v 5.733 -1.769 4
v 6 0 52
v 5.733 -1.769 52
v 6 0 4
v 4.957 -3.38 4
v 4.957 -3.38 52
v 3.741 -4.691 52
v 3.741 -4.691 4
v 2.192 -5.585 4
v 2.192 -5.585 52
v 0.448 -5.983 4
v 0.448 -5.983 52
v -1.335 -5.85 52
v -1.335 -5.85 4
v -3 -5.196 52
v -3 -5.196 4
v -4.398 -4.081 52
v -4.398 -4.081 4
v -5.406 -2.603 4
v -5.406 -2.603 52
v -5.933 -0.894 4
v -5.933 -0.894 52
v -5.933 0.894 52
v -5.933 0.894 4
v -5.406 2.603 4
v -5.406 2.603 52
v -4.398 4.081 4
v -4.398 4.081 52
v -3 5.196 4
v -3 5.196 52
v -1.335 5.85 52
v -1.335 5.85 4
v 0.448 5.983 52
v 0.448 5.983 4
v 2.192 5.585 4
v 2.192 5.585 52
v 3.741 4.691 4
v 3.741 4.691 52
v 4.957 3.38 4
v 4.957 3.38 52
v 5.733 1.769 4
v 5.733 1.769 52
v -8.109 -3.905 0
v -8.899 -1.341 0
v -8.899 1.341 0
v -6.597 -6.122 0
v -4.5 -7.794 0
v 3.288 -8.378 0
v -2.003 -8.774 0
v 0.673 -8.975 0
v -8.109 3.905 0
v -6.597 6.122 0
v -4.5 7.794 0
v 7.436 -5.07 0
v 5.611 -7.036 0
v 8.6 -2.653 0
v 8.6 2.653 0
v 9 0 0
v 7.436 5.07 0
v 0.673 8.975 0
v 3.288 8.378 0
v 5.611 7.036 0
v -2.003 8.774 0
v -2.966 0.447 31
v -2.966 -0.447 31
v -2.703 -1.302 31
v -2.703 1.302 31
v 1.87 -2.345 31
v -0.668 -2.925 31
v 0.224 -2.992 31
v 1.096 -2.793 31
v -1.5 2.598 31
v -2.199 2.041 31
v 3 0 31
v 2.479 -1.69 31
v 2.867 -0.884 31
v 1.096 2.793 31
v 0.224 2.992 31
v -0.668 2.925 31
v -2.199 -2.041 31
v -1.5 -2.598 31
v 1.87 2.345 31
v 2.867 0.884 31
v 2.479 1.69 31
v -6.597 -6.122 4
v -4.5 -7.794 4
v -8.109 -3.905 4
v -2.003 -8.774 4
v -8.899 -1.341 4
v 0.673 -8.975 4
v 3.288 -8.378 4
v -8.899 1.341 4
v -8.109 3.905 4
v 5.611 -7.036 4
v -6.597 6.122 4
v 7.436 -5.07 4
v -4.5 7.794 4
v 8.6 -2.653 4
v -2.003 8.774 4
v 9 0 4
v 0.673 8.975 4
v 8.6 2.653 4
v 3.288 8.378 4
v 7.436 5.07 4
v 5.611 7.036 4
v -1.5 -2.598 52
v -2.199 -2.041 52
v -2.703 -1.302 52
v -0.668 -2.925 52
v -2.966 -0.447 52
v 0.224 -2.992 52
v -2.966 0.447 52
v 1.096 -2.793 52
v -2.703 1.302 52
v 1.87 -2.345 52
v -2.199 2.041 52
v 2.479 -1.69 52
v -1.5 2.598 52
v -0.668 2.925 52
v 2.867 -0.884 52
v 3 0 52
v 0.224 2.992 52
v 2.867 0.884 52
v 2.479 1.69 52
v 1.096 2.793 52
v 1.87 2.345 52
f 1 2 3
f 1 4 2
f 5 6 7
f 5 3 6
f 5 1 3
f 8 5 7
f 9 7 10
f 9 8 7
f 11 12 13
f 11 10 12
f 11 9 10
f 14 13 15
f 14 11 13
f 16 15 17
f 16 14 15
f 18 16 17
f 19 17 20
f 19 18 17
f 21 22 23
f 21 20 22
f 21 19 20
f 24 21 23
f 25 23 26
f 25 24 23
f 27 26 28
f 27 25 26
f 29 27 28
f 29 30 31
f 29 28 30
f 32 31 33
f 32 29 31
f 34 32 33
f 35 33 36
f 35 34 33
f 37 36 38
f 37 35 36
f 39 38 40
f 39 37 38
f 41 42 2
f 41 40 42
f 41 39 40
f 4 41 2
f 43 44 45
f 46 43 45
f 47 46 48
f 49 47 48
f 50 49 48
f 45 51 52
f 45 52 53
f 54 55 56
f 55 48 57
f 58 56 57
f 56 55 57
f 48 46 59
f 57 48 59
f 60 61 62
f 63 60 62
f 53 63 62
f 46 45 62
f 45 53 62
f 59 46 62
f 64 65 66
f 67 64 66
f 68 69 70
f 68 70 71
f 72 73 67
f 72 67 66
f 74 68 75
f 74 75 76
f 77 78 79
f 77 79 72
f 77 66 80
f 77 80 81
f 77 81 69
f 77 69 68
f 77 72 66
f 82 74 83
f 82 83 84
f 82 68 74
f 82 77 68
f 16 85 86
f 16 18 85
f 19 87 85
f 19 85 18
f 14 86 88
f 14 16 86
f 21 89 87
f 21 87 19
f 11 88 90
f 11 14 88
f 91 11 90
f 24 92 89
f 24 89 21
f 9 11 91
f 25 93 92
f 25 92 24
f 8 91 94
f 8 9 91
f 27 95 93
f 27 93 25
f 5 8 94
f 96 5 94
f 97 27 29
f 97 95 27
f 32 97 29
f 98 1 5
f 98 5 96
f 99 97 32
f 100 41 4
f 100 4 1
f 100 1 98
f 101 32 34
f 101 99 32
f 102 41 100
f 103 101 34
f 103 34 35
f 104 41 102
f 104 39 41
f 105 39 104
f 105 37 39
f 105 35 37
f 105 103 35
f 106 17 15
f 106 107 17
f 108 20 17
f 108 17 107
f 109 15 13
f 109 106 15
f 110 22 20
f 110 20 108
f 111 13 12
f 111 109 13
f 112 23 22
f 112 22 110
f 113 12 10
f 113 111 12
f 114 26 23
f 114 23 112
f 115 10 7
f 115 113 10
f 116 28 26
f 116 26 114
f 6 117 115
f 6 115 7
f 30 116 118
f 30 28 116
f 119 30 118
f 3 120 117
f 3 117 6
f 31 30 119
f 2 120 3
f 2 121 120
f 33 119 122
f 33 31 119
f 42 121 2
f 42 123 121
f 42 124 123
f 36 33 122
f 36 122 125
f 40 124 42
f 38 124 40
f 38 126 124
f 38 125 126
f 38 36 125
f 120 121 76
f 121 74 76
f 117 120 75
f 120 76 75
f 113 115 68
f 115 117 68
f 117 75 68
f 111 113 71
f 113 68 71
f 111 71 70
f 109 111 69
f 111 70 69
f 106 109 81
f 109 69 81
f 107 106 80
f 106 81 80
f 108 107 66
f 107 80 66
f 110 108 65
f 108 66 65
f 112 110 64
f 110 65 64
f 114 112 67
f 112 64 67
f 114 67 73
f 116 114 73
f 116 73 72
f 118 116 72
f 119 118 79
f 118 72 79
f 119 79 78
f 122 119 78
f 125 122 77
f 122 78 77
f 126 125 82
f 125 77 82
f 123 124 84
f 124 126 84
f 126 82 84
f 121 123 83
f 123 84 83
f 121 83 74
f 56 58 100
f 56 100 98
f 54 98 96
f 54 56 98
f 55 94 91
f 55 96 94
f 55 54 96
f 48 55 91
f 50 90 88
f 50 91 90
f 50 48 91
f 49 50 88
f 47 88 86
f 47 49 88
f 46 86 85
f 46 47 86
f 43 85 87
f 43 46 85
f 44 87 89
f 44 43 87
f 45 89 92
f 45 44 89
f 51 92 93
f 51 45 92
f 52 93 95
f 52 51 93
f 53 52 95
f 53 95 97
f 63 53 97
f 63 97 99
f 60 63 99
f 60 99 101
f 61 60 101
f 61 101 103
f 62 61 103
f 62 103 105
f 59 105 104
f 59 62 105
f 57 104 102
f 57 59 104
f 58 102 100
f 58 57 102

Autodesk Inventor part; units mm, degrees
ref_plane "YZ Plane" through (0, 0, 0) normal (1, 0, 0) x (0, 1, 0)
ref_plane "XZ Plane" through (0, 0, 0) normal (0, 1, 0) x (-1, 0, 0)
ref_plane "XY Plane" through (0, 0, 0) normal (0, 0, 1) x (1, 0, 0)
sketch "Sketch1" plane through (0, 0, 0) normal (0, 0, 1) x (1, 0, 0)
  circle A0 centre (0, 0) radius 9
  dimension "d0" = 18
extrude "Extrusion1" add sketch "Sketch1" along normal blind 4
sketch "Sketch2" plane through (0, 0, 4) normal (0, 0, 1) x (1, 0, 0)
  circle A0 centre (0, 0) radius 6
  circle A1 centre (0, 0) radius 3
  dimension "d3" = 12
  dimension "d4" = 6
extrude "Extrusion2" add sketch "Sketch2" along normal blind 48
sketch "Sketch4" plane through (0, 0, 4) normal (0, 0, 1) x (1, 0, 0)
  circle A0 centre (0, 0) radius 3
extrude "Extrusion3" add sketch "Sketch4" along normal blind 27
properties part number "Adaptateur_axes"
